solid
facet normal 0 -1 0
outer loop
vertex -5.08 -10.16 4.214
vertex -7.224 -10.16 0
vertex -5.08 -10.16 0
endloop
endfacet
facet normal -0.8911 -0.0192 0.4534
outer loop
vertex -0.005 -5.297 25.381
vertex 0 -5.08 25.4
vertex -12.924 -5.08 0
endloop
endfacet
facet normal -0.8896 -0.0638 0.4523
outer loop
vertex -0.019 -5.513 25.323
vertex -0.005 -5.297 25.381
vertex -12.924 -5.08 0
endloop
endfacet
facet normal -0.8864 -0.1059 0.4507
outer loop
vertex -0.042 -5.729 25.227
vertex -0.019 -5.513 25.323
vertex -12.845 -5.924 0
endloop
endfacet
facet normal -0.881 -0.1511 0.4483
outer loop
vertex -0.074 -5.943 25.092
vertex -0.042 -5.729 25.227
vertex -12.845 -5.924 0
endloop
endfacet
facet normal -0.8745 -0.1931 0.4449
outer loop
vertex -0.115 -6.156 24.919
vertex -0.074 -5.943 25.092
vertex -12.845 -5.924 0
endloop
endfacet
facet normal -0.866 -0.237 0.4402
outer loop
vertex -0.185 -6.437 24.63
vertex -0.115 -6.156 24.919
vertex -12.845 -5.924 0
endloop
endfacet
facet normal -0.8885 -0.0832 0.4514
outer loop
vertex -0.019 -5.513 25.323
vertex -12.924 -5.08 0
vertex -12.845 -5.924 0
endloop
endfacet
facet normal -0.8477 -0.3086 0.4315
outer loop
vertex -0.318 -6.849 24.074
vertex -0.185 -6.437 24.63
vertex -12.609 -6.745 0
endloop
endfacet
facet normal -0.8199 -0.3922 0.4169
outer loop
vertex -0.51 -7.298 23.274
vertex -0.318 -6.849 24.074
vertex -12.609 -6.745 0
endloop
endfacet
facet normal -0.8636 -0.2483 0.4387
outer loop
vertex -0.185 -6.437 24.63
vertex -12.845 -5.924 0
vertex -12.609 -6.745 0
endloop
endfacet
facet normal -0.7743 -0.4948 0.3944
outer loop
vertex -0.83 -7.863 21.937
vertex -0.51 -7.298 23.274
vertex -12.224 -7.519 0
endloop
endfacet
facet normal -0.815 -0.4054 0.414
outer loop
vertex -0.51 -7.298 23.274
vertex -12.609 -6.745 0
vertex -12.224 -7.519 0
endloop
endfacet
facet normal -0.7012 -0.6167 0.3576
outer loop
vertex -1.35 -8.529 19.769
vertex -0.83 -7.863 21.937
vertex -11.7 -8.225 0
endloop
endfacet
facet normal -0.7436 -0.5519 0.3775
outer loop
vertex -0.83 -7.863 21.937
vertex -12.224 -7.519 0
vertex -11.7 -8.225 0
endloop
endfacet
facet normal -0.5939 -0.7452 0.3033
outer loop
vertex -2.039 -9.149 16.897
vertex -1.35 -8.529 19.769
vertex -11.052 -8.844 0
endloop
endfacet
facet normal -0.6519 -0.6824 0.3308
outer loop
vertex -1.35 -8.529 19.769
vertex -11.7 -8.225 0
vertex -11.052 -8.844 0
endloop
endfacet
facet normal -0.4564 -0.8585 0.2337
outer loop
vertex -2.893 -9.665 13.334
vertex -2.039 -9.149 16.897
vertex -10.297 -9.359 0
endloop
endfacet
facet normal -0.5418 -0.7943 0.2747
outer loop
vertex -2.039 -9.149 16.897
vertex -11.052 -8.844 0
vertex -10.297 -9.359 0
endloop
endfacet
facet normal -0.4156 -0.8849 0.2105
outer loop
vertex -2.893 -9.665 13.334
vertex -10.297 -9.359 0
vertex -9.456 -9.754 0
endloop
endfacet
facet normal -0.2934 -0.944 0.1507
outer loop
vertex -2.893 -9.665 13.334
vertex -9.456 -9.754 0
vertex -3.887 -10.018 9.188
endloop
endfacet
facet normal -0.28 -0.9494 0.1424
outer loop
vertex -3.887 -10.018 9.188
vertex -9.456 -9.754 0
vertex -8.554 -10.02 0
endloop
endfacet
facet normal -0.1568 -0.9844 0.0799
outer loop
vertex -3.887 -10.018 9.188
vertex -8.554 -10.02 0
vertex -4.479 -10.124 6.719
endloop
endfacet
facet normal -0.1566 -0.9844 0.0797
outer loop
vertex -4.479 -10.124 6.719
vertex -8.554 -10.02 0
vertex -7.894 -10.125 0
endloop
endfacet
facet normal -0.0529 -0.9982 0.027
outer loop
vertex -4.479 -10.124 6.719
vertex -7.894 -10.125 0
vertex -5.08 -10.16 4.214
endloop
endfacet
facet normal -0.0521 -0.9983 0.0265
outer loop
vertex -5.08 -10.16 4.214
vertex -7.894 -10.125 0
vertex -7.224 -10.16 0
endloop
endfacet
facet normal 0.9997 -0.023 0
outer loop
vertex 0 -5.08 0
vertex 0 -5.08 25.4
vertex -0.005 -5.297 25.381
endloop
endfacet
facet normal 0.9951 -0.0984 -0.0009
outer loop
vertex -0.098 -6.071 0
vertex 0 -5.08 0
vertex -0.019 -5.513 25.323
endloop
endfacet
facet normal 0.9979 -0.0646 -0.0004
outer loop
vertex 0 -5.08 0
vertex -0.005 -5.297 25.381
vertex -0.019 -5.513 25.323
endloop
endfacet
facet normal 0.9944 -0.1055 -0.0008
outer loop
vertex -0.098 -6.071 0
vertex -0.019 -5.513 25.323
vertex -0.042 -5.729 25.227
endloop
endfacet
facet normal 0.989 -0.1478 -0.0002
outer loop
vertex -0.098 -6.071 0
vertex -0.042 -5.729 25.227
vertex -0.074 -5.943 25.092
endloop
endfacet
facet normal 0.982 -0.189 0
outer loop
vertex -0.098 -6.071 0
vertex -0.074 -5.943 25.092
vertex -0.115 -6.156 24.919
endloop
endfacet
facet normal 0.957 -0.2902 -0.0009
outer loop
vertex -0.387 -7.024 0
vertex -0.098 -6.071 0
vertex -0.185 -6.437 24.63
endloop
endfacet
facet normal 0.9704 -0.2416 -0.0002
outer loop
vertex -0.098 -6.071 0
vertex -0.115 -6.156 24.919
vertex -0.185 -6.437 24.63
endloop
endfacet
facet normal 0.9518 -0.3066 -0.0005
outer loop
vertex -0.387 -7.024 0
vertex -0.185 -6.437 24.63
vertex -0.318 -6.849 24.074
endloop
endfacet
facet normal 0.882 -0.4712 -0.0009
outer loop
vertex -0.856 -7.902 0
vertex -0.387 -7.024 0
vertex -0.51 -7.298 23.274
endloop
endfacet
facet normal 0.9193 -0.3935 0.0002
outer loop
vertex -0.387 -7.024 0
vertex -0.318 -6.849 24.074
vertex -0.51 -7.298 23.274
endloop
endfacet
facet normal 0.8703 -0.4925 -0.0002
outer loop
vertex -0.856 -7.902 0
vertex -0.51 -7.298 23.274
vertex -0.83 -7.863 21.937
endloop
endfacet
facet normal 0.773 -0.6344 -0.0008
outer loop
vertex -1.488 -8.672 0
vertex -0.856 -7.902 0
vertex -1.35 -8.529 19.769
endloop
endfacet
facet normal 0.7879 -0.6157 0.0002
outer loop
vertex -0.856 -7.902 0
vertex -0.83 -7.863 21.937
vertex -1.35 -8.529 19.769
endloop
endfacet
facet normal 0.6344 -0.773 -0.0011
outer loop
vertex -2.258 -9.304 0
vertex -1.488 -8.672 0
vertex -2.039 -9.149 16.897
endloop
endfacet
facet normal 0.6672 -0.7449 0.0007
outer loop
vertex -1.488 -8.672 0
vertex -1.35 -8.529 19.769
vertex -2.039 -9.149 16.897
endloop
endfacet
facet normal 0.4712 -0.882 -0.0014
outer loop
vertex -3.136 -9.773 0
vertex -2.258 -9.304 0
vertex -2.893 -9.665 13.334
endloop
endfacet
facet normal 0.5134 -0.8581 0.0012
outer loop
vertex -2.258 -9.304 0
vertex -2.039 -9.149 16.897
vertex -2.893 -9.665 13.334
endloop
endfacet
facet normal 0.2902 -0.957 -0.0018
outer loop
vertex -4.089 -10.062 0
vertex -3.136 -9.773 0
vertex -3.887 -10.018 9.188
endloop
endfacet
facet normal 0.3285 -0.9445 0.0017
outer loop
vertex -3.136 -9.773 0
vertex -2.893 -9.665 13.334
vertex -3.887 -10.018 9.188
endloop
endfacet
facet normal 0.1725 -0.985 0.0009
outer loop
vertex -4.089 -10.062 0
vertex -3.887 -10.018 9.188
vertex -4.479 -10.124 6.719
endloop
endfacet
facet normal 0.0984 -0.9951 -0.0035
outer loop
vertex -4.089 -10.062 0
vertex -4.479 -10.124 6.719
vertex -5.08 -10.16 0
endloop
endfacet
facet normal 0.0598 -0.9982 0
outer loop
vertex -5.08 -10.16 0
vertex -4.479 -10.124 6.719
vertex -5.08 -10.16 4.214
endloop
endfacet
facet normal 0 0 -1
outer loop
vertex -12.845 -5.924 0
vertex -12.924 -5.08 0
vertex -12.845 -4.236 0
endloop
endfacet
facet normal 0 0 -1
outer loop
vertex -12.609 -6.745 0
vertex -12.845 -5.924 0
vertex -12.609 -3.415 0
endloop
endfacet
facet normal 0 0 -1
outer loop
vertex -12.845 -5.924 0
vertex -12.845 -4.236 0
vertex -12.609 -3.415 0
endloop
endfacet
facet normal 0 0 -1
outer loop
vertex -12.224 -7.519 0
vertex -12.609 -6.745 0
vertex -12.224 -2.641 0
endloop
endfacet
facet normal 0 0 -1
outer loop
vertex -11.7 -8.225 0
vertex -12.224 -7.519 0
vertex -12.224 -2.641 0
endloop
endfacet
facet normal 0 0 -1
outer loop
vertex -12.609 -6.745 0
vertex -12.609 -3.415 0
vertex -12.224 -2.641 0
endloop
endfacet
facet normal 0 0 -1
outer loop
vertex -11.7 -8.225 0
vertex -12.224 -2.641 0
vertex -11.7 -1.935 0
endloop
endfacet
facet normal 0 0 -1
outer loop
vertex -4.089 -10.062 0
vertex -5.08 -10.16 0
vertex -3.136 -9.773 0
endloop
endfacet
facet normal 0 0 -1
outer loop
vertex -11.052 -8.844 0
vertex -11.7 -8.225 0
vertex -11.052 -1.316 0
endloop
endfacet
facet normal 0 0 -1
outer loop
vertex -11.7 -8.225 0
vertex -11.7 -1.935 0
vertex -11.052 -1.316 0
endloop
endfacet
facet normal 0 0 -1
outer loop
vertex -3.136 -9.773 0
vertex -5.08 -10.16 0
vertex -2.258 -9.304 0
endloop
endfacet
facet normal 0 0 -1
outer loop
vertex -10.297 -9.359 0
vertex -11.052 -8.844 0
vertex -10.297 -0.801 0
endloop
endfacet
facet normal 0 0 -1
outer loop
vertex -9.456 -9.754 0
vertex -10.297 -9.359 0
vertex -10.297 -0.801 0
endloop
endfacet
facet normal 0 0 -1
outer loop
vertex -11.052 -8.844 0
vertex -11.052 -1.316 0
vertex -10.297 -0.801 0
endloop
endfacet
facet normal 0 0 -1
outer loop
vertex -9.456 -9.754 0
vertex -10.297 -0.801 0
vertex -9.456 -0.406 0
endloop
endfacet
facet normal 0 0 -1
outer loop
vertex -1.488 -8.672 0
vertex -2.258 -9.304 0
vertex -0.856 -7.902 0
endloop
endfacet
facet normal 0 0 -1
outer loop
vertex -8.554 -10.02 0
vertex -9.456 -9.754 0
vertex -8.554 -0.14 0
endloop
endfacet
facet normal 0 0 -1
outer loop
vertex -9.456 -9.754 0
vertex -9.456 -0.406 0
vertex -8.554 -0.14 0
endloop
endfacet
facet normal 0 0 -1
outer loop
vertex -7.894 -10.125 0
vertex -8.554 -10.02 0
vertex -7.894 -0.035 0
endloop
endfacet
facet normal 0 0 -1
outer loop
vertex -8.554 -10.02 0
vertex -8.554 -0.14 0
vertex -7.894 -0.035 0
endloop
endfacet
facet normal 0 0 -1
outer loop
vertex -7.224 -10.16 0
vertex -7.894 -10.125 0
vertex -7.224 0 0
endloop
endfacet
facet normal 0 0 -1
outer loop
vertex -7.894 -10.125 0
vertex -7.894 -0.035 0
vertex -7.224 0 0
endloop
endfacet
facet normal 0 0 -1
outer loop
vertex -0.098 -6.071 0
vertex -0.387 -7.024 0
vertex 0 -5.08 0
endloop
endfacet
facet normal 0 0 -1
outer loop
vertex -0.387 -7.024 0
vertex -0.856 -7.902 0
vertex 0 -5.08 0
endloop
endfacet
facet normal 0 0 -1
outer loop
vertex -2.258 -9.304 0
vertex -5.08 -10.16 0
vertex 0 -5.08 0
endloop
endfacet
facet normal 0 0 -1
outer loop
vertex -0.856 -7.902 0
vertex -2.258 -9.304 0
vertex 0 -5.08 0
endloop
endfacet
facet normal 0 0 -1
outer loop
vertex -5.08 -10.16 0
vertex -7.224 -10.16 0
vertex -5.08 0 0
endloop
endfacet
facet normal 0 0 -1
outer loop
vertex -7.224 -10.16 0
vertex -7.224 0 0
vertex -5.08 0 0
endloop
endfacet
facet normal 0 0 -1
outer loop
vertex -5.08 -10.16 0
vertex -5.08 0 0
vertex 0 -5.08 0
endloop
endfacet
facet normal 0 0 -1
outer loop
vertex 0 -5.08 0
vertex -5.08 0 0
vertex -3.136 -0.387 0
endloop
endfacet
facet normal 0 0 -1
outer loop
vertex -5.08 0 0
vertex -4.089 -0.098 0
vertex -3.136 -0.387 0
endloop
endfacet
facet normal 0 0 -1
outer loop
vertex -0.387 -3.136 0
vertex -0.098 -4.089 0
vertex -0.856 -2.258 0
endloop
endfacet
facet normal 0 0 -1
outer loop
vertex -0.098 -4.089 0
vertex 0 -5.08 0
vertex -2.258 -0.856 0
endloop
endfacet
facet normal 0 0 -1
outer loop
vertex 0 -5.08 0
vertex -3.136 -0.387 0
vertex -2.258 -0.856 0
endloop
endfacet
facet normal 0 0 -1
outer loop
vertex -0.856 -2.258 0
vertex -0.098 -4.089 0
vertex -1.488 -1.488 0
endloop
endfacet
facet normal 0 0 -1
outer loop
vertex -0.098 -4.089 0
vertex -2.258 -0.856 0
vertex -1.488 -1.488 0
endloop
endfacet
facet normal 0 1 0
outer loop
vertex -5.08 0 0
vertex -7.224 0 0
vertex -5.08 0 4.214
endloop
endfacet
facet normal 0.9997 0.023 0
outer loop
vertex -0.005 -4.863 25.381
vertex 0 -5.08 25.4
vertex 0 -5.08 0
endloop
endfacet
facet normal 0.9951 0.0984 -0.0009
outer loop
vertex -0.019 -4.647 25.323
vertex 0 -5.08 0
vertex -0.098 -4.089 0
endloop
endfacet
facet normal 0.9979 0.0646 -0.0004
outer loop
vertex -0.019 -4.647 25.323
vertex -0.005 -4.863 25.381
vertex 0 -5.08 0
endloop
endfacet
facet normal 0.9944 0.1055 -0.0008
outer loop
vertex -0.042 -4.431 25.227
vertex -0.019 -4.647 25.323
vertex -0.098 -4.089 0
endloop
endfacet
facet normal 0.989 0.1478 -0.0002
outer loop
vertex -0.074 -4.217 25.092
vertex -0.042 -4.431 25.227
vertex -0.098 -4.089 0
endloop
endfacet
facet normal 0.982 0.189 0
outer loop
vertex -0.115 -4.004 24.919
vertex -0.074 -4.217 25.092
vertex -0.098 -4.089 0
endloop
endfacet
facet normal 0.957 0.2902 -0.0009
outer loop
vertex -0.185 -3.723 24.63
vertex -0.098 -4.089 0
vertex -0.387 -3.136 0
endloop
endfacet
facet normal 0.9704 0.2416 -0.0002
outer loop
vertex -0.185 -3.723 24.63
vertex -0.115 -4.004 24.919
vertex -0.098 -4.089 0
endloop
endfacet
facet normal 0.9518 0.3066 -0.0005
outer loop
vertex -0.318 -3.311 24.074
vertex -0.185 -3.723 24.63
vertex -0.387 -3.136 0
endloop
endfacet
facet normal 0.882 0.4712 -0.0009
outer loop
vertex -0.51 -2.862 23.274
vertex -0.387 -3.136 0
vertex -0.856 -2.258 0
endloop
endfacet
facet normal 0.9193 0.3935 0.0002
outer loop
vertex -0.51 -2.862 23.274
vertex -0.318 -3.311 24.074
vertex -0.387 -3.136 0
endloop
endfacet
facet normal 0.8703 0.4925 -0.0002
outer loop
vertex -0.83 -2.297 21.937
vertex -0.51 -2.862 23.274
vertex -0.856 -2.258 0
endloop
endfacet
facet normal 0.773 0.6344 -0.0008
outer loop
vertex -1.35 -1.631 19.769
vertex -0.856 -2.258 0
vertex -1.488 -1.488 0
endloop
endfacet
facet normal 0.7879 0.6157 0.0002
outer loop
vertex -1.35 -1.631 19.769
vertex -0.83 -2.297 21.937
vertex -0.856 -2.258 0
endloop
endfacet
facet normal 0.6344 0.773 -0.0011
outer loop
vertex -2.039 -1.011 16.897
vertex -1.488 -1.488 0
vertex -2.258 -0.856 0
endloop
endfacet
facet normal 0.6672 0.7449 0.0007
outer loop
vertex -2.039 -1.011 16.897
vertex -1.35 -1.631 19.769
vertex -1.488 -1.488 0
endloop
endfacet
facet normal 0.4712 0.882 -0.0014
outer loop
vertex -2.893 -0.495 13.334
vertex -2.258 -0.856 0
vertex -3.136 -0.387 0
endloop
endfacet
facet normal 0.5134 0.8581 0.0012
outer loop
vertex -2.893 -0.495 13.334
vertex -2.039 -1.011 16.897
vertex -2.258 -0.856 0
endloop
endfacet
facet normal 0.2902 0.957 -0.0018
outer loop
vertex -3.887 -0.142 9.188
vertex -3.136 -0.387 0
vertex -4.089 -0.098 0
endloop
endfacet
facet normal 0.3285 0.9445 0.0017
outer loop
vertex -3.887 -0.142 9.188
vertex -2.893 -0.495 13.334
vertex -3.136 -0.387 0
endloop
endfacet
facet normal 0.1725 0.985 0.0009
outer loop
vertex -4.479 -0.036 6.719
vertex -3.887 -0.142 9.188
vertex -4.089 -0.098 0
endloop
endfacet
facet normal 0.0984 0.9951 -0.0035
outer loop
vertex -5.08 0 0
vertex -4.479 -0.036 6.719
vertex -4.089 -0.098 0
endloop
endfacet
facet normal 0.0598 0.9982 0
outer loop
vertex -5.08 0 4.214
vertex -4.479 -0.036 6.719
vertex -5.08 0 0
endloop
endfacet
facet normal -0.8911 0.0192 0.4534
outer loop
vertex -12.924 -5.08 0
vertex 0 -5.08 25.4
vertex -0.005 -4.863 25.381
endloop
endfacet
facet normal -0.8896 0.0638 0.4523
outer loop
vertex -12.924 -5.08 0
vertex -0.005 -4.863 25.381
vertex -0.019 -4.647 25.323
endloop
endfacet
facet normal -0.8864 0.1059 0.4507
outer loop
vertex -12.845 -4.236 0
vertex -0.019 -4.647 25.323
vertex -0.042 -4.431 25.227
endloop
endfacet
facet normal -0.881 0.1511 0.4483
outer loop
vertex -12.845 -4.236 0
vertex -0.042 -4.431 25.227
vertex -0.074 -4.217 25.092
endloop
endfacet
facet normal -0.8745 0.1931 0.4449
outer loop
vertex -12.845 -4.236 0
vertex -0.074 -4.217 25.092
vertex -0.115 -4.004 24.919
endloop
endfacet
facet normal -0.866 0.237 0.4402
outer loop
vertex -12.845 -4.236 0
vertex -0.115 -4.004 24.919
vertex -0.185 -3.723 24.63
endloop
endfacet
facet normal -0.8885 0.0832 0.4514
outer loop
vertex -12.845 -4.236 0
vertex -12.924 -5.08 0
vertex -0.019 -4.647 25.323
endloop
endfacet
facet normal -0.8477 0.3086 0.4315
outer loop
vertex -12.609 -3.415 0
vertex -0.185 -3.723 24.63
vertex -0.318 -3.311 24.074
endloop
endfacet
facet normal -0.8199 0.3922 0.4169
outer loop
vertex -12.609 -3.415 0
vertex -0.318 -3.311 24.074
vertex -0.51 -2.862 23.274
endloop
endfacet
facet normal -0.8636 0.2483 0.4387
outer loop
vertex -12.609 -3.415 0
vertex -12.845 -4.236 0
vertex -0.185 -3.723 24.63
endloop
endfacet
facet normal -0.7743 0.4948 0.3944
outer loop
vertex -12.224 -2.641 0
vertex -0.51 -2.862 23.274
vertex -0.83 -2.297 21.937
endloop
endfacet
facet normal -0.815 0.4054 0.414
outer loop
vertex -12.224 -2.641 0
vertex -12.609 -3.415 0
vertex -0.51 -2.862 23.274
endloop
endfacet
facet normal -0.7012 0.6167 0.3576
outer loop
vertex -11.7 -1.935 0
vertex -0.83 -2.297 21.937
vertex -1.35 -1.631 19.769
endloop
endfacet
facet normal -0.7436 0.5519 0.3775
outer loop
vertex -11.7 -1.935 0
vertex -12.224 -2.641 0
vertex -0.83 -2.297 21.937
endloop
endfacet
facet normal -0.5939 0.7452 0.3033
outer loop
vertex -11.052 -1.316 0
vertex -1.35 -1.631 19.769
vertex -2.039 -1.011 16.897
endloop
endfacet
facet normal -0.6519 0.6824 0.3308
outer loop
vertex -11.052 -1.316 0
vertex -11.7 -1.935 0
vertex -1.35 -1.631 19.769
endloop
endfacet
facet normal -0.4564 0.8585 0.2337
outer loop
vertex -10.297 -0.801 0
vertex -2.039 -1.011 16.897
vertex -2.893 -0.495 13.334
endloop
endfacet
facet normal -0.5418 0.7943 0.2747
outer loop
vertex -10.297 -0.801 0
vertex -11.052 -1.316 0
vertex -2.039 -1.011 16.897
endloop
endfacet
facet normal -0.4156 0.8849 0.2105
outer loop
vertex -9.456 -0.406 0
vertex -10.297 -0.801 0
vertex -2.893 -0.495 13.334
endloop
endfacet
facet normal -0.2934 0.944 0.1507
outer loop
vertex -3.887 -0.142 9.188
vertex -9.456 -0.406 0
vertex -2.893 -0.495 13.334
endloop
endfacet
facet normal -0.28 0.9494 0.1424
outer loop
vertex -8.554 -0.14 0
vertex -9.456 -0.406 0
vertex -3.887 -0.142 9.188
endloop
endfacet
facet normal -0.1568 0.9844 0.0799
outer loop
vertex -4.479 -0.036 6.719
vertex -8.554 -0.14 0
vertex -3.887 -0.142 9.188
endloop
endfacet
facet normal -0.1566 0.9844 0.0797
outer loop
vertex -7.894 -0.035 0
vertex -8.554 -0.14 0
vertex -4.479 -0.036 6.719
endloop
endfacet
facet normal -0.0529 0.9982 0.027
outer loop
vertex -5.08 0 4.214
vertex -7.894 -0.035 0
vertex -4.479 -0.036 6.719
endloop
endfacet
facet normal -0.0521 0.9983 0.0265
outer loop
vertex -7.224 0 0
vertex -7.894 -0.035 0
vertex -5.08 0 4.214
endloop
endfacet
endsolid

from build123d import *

# Parameters (mm, degrees)
F1_DEPTH = 10.16
F2_R     = 5.07999


# Not quite as in the source:
# - a fillet or chamfer is up to 0.001 mm smaller than in the source, because OpenCascade refuses the exact size


with BuildPart() as f1:
    # F0 (on Front) → F1 (new body)
    with BuildSketch(Plane.XZ):
        Polygon((-12.9241171581, 0), (0, 0), (0, 25.4), align=None)
    extrude(amount=F1_DEPTH)

    # F2 (radius 5.08 in the source; OpenCascade refuses exactly that, so slightly less here)
    f2_edges = [f1.edges().sort_by_distance(p)[0] for p in [
        (-6.462059, 0, 12.7),
        (-6.462059, -10.16, 12.7),
        (0, 0, 12.7),
        (0, -10.16, 12.7),
    ]]
    fillet(f2_edges, radius=F2_R)


solid = f1.part
